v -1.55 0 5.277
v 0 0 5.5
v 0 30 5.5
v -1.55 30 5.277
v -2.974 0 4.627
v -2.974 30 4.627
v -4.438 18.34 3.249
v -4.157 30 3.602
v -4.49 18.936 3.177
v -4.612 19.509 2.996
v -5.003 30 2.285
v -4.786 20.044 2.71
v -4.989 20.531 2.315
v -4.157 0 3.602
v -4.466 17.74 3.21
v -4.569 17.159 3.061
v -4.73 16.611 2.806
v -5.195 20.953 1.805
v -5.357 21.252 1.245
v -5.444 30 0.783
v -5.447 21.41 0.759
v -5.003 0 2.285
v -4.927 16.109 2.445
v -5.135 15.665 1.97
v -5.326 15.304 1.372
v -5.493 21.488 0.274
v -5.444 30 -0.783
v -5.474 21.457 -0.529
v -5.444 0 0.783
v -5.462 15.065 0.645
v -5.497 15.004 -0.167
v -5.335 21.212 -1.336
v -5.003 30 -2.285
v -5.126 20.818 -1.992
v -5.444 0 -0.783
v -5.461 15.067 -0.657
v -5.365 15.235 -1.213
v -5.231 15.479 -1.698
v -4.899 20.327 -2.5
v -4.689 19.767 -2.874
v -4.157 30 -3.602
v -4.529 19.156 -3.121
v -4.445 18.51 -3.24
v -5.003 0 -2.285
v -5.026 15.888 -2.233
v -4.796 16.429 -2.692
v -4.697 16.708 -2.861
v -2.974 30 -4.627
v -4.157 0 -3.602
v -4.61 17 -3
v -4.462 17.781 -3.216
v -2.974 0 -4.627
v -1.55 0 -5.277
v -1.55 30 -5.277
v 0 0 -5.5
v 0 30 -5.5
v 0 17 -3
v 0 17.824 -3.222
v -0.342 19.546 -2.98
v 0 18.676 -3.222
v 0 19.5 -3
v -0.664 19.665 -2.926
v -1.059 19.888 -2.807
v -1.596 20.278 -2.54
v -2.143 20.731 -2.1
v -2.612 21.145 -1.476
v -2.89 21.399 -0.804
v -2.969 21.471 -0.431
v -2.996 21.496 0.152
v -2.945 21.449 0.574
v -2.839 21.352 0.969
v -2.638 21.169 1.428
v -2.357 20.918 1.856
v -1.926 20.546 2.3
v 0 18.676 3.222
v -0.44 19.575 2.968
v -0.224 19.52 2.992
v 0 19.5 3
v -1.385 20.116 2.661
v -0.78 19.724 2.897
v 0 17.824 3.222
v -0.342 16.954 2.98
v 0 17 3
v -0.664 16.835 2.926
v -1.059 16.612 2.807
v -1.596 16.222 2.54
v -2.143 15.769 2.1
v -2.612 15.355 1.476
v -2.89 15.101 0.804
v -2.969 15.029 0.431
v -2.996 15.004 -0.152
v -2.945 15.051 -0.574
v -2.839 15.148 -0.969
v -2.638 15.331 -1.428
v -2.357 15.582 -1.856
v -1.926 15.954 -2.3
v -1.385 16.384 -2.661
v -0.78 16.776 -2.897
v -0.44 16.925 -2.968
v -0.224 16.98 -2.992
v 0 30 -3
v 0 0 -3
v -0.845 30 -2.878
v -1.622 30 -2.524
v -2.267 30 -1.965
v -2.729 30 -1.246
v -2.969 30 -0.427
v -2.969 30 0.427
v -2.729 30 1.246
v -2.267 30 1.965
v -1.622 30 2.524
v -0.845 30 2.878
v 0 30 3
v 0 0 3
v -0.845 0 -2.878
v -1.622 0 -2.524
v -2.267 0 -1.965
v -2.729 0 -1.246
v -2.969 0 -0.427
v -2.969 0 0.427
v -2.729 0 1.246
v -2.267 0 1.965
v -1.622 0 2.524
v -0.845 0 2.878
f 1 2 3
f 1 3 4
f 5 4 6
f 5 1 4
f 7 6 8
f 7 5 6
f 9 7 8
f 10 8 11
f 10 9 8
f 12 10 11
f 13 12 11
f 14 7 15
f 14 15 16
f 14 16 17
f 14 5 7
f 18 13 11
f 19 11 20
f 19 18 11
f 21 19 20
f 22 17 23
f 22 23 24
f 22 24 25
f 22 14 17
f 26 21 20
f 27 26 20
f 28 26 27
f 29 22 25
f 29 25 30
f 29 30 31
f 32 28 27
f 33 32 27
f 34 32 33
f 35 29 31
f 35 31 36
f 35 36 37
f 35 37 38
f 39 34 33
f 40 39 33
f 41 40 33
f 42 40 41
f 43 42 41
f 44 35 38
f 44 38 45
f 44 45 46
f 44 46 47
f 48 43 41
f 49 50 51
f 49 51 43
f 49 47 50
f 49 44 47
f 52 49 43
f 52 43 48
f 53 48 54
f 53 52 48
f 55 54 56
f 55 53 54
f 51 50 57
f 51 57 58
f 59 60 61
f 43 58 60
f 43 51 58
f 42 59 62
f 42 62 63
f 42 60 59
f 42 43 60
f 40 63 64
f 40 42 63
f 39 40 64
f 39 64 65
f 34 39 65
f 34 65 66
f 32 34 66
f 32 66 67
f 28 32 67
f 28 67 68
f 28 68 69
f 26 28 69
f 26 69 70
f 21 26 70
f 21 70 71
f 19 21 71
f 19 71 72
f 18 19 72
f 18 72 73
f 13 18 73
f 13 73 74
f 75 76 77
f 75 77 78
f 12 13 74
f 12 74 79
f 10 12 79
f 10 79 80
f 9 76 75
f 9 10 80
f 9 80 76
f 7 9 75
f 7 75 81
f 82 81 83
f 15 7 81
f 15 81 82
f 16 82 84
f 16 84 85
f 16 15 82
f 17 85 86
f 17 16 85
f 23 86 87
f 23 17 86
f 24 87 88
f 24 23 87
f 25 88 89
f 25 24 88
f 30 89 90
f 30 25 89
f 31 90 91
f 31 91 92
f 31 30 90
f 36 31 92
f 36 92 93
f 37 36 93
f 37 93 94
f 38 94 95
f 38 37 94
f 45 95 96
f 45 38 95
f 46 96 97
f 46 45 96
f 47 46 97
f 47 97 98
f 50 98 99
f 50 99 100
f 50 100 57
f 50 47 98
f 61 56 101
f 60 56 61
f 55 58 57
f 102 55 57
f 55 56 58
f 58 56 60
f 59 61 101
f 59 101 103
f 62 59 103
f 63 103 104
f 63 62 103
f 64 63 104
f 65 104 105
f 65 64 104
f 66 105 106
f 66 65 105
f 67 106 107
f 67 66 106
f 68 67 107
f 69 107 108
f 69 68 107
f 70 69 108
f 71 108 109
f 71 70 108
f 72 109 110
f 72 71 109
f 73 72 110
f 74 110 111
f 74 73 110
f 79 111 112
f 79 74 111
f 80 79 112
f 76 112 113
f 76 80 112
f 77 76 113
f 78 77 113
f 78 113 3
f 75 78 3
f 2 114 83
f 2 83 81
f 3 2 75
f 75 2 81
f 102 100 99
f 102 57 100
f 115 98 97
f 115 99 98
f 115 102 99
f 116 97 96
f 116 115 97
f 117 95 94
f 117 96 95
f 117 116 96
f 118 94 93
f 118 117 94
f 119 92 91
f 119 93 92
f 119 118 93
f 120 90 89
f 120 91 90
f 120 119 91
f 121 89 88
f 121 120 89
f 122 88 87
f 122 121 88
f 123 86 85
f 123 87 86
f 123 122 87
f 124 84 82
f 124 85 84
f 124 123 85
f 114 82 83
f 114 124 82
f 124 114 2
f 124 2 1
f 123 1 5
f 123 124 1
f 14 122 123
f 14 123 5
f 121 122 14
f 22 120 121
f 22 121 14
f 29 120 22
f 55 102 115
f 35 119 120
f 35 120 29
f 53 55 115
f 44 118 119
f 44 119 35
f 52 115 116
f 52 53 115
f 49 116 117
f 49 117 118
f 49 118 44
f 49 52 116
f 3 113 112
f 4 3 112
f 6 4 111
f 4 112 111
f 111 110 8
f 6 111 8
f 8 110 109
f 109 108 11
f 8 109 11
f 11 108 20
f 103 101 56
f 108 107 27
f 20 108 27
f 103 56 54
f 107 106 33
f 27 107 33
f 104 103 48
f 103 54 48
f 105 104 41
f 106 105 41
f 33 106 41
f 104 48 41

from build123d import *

# Parameters (mm, degrees)
BOSS_EXTRUDE1_DEPTH     = 30
CUT_EXTRUDE1_DEPTH      = 31.991934435
CUT_EXTRUDE1_DEPTH_BACK = 31.991934435
SKETCH2_R               = 3.25


with BuildPart() as part:
    # Sketch1 → Boss-Extrude1 (new body)
    with BuildSketch(Plane(origin=(0, 0, 0), x_dir=(1, 0, 0), z_dir=(0, 1, 0))):
        with BuildLine():
            Line((0, 5.5), (0, 3))
            ThreePointArc((0, 3), (-3, 0), (0, -3))
            Line((0, -3), (0, -5.5))
            ThreePointArc((0, -5.5), (-5.5, 0), (0, 5.5))
        make_face()
    extrude(amount=BOSS_EXTRUDE1_DEPTH)

    # Sketch2 → Cut-Extrude1 (cut, two sides: drawn at the far end of the back side and taken through both)
    with BuildSketch(Plane(origin=(0, 0, 0), x_dir=(0, 0, -1), z_dir=(1, 0, 0)).offset(-CUT_EXTRUDE1_DEPTH_BACK)):
        with Locations(Location((0, 18.25, 0), (0, 0, 337.380135052))):
            Circle(SKETCH2_R)
    extrude(amount=CUT_EXTRUDE1_DEPTH + CUT_EXTRUDE1_DEPTH_BACK, mode=Mode.SUBTRACT)


solid = part.part
